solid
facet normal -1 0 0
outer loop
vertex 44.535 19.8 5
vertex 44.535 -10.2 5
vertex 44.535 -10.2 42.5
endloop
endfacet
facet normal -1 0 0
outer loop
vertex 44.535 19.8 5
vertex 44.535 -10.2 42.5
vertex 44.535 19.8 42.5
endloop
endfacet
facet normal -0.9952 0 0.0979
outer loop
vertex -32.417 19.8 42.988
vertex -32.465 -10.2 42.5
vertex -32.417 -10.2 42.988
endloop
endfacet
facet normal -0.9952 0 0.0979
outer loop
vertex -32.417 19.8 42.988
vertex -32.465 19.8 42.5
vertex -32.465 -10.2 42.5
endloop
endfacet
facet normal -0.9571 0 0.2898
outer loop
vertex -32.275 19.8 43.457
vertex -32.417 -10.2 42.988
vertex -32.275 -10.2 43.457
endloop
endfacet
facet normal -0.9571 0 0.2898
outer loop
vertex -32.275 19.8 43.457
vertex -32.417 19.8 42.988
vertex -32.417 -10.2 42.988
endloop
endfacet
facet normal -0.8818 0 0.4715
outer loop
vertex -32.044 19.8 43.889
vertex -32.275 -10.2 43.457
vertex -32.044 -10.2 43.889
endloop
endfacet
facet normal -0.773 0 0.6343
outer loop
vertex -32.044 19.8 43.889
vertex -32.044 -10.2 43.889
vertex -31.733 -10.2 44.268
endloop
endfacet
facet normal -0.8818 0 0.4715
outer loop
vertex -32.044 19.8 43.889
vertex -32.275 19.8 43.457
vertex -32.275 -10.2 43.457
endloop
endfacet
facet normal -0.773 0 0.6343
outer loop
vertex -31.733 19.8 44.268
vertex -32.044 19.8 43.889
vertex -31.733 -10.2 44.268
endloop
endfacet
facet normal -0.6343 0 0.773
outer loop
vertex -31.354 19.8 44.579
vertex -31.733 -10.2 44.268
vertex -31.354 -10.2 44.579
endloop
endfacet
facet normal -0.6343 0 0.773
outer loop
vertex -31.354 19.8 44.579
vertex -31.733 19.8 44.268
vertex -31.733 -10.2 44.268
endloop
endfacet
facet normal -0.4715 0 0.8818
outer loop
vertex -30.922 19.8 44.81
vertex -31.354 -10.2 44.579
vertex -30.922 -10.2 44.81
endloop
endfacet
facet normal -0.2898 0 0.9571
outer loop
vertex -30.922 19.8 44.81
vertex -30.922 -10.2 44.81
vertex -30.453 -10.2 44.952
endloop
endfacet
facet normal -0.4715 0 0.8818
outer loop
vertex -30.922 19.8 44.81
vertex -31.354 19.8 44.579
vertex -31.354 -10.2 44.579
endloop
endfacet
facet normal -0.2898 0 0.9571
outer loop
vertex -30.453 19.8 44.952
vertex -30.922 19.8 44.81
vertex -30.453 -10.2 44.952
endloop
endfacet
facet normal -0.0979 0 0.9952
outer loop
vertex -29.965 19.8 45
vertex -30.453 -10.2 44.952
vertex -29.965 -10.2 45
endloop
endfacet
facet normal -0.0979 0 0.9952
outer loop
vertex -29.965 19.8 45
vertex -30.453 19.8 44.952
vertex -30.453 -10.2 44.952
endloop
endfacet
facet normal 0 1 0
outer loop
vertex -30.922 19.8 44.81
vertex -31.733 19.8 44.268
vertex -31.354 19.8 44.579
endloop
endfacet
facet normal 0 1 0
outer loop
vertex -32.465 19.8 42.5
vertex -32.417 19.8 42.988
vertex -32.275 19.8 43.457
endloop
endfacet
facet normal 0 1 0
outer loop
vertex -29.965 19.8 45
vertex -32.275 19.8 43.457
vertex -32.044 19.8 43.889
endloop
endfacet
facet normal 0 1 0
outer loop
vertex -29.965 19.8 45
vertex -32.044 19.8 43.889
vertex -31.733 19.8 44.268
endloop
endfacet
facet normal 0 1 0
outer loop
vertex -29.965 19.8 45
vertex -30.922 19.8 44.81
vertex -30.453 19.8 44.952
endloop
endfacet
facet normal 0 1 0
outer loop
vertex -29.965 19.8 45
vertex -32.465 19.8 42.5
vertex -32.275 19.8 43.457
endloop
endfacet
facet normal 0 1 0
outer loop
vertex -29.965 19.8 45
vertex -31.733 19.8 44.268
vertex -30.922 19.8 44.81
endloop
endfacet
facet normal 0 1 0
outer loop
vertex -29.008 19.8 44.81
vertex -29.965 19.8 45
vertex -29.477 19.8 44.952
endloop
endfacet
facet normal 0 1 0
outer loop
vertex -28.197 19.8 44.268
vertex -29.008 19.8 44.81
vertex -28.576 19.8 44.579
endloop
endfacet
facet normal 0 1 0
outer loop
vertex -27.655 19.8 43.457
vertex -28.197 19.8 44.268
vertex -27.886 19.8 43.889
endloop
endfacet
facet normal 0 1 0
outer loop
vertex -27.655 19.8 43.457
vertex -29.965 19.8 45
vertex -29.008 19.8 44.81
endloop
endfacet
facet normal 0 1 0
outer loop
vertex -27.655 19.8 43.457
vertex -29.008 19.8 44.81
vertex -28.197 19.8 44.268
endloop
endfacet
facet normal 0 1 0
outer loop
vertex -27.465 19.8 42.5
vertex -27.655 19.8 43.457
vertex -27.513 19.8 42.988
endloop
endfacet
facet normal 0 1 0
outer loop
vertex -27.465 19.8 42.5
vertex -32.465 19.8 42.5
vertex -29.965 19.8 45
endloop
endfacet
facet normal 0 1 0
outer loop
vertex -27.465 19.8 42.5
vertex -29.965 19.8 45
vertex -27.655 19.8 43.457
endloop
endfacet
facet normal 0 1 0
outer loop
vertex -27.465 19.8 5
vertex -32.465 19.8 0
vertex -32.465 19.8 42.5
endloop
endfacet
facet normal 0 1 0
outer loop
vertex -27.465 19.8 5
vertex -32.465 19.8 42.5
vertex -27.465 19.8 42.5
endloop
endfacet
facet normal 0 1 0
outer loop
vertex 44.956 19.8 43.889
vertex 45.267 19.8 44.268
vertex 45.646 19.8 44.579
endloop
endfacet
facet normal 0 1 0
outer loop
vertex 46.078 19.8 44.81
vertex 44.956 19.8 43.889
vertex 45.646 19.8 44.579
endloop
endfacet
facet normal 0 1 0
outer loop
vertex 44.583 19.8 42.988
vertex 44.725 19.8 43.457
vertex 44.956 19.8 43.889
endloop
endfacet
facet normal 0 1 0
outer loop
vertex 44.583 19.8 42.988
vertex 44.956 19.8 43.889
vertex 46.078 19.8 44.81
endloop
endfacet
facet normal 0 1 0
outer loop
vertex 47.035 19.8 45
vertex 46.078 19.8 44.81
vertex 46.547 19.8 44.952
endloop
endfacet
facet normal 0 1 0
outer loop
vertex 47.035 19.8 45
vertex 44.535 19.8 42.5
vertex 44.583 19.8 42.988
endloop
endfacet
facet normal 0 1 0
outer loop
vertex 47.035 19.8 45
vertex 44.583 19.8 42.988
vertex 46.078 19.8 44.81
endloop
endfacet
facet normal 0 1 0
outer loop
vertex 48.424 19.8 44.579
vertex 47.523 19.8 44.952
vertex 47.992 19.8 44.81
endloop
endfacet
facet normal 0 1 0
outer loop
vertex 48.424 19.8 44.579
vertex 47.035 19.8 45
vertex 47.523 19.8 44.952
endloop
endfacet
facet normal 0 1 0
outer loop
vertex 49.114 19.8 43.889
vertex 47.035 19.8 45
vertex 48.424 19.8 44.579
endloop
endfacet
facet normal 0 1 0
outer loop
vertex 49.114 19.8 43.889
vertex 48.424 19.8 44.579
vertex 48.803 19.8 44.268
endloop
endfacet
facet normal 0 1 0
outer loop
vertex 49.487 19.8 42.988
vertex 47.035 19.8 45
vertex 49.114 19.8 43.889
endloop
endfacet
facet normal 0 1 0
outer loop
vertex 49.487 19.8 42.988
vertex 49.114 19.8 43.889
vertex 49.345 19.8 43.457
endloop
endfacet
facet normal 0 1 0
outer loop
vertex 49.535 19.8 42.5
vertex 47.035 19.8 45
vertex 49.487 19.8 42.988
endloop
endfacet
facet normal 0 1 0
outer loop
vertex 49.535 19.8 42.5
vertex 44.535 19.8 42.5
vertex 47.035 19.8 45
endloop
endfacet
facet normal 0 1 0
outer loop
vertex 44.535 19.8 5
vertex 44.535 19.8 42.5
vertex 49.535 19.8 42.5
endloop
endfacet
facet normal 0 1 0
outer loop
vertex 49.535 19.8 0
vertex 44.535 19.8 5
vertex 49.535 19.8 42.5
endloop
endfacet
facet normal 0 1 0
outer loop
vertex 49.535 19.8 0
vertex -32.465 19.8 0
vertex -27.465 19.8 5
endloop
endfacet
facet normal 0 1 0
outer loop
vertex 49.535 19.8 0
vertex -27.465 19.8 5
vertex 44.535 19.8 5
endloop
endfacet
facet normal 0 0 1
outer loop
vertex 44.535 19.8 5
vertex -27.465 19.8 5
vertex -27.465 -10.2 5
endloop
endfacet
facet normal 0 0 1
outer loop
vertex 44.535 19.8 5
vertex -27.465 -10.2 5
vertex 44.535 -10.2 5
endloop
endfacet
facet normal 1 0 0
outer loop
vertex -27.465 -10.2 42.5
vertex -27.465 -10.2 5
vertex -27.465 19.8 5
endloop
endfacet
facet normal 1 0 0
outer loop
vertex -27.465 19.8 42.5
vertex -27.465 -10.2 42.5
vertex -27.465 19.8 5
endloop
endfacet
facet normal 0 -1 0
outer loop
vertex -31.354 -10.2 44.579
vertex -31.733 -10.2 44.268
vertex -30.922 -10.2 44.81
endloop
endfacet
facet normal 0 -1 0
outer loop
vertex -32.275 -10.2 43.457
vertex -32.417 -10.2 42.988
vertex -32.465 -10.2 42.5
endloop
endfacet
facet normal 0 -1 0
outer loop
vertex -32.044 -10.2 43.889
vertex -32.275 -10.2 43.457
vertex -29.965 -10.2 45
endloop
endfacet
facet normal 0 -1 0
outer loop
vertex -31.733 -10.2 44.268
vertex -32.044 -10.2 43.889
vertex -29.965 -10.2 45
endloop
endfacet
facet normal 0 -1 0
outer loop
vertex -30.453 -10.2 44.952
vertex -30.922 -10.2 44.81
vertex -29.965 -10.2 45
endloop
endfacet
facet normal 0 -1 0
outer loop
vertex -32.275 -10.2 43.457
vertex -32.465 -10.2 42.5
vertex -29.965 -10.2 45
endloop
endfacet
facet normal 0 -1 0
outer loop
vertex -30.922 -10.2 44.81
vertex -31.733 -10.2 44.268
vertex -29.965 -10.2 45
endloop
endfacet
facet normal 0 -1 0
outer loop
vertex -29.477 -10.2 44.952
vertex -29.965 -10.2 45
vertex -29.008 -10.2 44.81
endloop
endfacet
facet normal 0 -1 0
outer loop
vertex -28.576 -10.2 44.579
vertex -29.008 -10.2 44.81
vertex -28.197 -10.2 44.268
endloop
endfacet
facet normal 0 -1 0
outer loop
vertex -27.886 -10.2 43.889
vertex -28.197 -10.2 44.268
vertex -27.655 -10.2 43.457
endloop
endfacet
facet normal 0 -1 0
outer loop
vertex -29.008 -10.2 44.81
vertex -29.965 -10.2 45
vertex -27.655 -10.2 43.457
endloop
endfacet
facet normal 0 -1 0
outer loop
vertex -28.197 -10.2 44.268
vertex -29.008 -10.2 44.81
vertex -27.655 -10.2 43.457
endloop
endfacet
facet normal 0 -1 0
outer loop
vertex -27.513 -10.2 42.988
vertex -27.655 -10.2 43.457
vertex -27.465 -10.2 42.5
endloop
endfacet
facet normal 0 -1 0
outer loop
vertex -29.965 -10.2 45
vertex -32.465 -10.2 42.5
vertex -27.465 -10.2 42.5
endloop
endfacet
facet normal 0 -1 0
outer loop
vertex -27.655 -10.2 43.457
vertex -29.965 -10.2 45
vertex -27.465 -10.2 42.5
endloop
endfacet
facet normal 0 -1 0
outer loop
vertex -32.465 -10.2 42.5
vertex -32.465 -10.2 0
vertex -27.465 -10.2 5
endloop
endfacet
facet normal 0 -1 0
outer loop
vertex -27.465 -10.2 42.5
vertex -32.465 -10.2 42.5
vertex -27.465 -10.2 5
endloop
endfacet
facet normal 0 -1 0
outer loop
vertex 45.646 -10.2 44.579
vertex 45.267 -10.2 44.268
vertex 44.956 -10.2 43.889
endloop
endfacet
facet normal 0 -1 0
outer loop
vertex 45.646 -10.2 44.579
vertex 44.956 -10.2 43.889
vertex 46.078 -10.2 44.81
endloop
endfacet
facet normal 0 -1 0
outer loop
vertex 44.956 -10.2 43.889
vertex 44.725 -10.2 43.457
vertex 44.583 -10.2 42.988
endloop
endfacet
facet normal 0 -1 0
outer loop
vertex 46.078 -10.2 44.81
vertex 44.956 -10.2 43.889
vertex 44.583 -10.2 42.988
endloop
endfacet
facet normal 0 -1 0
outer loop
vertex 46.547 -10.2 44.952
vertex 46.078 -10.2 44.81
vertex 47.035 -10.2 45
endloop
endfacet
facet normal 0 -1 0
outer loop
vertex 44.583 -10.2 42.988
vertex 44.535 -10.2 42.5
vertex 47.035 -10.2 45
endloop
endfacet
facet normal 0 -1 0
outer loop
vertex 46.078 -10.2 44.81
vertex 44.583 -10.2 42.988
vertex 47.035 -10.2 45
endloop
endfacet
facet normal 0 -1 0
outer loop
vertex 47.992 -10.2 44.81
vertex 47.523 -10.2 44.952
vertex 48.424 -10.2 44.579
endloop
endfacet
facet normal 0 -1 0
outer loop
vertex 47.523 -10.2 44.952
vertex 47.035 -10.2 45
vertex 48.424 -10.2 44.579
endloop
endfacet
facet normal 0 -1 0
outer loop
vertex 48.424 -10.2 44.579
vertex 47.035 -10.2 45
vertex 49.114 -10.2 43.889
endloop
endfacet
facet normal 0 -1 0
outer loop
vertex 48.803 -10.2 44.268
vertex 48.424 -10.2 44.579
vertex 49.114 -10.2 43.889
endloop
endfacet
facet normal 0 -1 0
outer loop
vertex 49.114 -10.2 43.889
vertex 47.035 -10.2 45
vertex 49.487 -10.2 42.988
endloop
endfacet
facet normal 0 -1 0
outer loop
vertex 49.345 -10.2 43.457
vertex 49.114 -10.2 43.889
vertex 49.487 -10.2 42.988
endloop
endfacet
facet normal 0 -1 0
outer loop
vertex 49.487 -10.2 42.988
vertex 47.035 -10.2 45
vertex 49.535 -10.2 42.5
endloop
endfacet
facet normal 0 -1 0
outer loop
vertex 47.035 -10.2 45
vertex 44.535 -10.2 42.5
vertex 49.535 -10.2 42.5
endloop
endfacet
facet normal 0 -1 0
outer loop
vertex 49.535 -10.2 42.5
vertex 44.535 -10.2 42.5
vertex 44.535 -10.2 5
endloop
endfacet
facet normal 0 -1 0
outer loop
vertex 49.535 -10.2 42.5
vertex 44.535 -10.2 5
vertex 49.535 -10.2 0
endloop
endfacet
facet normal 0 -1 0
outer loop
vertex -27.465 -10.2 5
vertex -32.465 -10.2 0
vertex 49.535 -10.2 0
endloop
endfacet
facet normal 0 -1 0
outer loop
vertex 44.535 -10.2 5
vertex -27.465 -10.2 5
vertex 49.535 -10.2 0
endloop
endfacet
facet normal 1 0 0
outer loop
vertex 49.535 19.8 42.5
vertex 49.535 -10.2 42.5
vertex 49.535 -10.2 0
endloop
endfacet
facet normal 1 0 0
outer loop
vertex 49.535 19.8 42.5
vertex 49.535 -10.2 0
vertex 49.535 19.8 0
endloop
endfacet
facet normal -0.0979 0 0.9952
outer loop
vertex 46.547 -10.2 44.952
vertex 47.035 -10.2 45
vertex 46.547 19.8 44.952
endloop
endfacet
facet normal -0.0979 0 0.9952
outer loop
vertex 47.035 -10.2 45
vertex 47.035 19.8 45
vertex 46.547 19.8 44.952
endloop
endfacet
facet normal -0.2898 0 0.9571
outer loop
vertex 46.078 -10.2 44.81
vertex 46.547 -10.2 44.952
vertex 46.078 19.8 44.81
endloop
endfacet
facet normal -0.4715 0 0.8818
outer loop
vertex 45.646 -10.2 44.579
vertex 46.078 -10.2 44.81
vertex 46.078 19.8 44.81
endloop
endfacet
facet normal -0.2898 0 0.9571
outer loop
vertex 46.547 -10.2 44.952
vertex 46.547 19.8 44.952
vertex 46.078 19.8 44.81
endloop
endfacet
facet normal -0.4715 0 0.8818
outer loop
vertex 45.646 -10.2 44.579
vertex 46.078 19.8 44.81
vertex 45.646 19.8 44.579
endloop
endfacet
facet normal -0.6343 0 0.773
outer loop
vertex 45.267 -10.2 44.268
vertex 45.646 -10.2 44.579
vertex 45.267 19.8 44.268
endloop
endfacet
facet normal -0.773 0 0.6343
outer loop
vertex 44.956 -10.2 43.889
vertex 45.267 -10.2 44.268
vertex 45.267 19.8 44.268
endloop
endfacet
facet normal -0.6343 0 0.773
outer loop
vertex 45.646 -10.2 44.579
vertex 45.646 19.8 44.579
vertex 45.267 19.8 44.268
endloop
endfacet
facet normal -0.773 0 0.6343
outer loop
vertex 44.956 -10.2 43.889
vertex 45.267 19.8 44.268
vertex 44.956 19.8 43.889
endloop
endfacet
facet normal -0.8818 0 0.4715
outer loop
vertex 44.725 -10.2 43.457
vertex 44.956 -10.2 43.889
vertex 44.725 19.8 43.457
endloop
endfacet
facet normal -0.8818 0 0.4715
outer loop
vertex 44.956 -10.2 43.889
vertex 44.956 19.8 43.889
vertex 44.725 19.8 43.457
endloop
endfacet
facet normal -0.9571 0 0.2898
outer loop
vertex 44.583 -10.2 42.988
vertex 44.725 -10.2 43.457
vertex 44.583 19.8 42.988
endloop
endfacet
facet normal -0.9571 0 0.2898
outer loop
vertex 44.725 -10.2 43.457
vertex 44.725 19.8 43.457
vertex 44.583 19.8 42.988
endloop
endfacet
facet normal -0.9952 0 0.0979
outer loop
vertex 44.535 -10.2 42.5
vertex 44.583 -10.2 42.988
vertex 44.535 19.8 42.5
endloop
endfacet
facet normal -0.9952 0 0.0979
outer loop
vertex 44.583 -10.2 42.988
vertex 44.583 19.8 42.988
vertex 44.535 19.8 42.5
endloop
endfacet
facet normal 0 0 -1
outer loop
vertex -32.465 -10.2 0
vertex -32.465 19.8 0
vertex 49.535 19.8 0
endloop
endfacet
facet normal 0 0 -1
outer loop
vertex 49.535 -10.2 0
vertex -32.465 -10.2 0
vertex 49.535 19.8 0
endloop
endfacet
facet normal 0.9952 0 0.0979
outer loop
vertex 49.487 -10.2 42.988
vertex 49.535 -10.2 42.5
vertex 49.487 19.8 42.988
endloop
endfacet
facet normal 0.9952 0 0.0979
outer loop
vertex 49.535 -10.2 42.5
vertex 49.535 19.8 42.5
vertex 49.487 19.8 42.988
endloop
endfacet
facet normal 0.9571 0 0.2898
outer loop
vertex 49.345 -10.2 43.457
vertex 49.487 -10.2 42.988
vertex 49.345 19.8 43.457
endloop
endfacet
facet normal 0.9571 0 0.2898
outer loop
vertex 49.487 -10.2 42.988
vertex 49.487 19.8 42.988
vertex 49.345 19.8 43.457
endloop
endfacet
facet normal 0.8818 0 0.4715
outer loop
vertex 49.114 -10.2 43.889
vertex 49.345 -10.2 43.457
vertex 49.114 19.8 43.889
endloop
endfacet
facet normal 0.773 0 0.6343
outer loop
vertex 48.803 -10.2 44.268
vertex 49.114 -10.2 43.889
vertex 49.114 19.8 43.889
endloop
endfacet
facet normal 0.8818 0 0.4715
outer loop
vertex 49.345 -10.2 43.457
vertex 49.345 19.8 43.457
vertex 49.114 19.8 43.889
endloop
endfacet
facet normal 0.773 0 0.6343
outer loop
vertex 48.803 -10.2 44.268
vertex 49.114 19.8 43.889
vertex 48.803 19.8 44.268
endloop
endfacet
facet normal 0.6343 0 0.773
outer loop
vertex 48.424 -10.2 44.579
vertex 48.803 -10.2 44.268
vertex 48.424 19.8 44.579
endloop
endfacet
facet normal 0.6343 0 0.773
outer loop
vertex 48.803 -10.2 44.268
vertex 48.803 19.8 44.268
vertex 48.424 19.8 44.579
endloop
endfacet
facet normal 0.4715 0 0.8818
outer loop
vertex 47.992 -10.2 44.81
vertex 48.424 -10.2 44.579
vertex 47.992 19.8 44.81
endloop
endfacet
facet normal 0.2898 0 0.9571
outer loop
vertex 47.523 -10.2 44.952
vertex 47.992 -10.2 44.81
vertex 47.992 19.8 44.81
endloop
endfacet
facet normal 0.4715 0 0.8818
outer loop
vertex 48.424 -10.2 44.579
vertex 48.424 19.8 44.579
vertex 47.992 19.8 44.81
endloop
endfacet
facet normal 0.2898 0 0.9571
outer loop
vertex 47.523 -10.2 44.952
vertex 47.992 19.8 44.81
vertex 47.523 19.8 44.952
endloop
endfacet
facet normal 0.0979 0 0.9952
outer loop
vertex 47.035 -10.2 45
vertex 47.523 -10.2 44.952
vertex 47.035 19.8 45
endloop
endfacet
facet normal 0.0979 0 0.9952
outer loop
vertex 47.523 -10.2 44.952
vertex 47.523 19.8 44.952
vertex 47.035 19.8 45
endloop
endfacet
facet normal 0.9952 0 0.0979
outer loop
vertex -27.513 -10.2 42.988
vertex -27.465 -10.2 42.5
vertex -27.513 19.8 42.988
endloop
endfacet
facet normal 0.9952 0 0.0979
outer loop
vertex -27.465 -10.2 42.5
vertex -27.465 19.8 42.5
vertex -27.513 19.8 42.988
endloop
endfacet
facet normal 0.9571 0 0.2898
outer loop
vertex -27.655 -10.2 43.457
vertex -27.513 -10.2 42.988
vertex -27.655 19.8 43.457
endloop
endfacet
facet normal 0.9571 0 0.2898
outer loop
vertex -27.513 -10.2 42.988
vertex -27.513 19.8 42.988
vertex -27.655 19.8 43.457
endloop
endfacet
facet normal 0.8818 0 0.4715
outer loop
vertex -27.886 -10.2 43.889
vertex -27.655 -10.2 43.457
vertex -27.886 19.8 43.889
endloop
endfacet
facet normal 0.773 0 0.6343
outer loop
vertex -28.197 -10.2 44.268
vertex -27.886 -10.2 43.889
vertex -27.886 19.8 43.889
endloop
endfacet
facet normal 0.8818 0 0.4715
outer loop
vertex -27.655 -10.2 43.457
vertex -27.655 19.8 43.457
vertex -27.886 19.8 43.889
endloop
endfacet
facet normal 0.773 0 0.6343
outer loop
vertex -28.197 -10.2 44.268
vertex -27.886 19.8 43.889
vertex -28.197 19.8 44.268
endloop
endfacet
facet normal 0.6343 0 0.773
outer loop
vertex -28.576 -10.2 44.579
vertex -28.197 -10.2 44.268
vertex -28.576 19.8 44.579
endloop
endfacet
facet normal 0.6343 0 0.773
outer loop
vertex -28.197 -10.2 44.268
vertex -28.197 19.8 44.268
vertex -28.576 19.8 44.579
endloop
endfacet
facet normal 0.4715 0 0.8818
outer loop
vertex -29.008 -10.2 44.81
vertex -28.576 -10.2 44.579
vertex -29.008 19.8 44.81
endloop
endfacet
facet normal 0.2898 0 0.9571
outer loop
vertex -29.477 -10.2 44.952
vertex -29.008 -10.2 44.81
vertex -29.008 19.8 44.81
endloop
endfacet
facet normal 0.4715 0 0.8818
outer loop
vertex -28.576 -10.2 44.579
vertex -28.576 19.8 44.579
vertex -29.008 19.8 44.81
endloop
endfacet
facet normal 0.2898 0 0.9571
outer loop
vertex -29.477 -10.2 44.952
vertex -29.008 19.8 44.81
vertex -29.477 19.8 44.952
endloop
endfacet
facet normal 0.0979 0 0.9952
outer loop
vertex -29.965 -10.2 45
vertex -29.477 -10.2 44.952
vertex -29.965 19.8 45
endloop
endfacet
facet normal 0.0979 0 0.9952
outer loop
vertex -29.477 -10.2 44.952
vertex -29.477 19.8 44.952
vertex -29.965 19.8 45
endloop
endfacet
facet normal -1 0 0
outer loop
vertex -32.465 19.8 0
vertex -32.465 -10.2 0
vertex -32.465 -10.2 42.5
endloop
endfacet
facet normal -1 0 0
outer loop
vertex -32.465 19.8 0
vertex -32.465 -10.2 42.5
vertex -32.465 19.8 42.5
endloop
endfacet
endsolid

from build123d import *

# Parameters (mm, degrees)
SKETCH_1_W      = 82
SKETCH_1_H      = 30
EXTRUDE_1_DEPTH = 5
SKETCH_2_W      = 5
SKETCH_2_H      = 30
EXTRUDE_2_DEPTH = 40
FILLET_1_R      = 2.5


with BuildPart() as part:
    # 草圖1 → 填料-伸長1 (new body)
    with BuildSketch(Plane.XY):
        with Locations((8.53492865, 4.8)):
            Rectangle(SKETCH_1_W, SKETCH_1_H)
    extrude(amount=EXTRUDE_1_DEPTH)

    # 草圖2 → 填料-伸長2 (add)
    with BuildSketch(Plane.XY.offset(5)):
        with Locations((-29.96507135, 4.8)):
            Rectangle(SKETCH_2_W, SKETCH_2_H)
        with Locations((47.03492865, 4.8)):
            Rectangle(SKETCH_2_W, SKETCH_2_H)
    extrude(amount=EXTRUDE_2_DEPTH)

    # 圓角1
    fillet_1_edges = [part.edges().sort_by_distance(p)[0] for p in [
        (44.53492865, 4.8, 45),
        (-27.46507135, 4.8, 45),
        (49.53492865, 4.8, 45),
        (-32.46507135, 4.8, 45),
    ]]
    fillet(fillet_1_edges, radius=FILLET_1_R - 0.0001)  # a hair under: the kernel refuses the full size


solid = part.part
